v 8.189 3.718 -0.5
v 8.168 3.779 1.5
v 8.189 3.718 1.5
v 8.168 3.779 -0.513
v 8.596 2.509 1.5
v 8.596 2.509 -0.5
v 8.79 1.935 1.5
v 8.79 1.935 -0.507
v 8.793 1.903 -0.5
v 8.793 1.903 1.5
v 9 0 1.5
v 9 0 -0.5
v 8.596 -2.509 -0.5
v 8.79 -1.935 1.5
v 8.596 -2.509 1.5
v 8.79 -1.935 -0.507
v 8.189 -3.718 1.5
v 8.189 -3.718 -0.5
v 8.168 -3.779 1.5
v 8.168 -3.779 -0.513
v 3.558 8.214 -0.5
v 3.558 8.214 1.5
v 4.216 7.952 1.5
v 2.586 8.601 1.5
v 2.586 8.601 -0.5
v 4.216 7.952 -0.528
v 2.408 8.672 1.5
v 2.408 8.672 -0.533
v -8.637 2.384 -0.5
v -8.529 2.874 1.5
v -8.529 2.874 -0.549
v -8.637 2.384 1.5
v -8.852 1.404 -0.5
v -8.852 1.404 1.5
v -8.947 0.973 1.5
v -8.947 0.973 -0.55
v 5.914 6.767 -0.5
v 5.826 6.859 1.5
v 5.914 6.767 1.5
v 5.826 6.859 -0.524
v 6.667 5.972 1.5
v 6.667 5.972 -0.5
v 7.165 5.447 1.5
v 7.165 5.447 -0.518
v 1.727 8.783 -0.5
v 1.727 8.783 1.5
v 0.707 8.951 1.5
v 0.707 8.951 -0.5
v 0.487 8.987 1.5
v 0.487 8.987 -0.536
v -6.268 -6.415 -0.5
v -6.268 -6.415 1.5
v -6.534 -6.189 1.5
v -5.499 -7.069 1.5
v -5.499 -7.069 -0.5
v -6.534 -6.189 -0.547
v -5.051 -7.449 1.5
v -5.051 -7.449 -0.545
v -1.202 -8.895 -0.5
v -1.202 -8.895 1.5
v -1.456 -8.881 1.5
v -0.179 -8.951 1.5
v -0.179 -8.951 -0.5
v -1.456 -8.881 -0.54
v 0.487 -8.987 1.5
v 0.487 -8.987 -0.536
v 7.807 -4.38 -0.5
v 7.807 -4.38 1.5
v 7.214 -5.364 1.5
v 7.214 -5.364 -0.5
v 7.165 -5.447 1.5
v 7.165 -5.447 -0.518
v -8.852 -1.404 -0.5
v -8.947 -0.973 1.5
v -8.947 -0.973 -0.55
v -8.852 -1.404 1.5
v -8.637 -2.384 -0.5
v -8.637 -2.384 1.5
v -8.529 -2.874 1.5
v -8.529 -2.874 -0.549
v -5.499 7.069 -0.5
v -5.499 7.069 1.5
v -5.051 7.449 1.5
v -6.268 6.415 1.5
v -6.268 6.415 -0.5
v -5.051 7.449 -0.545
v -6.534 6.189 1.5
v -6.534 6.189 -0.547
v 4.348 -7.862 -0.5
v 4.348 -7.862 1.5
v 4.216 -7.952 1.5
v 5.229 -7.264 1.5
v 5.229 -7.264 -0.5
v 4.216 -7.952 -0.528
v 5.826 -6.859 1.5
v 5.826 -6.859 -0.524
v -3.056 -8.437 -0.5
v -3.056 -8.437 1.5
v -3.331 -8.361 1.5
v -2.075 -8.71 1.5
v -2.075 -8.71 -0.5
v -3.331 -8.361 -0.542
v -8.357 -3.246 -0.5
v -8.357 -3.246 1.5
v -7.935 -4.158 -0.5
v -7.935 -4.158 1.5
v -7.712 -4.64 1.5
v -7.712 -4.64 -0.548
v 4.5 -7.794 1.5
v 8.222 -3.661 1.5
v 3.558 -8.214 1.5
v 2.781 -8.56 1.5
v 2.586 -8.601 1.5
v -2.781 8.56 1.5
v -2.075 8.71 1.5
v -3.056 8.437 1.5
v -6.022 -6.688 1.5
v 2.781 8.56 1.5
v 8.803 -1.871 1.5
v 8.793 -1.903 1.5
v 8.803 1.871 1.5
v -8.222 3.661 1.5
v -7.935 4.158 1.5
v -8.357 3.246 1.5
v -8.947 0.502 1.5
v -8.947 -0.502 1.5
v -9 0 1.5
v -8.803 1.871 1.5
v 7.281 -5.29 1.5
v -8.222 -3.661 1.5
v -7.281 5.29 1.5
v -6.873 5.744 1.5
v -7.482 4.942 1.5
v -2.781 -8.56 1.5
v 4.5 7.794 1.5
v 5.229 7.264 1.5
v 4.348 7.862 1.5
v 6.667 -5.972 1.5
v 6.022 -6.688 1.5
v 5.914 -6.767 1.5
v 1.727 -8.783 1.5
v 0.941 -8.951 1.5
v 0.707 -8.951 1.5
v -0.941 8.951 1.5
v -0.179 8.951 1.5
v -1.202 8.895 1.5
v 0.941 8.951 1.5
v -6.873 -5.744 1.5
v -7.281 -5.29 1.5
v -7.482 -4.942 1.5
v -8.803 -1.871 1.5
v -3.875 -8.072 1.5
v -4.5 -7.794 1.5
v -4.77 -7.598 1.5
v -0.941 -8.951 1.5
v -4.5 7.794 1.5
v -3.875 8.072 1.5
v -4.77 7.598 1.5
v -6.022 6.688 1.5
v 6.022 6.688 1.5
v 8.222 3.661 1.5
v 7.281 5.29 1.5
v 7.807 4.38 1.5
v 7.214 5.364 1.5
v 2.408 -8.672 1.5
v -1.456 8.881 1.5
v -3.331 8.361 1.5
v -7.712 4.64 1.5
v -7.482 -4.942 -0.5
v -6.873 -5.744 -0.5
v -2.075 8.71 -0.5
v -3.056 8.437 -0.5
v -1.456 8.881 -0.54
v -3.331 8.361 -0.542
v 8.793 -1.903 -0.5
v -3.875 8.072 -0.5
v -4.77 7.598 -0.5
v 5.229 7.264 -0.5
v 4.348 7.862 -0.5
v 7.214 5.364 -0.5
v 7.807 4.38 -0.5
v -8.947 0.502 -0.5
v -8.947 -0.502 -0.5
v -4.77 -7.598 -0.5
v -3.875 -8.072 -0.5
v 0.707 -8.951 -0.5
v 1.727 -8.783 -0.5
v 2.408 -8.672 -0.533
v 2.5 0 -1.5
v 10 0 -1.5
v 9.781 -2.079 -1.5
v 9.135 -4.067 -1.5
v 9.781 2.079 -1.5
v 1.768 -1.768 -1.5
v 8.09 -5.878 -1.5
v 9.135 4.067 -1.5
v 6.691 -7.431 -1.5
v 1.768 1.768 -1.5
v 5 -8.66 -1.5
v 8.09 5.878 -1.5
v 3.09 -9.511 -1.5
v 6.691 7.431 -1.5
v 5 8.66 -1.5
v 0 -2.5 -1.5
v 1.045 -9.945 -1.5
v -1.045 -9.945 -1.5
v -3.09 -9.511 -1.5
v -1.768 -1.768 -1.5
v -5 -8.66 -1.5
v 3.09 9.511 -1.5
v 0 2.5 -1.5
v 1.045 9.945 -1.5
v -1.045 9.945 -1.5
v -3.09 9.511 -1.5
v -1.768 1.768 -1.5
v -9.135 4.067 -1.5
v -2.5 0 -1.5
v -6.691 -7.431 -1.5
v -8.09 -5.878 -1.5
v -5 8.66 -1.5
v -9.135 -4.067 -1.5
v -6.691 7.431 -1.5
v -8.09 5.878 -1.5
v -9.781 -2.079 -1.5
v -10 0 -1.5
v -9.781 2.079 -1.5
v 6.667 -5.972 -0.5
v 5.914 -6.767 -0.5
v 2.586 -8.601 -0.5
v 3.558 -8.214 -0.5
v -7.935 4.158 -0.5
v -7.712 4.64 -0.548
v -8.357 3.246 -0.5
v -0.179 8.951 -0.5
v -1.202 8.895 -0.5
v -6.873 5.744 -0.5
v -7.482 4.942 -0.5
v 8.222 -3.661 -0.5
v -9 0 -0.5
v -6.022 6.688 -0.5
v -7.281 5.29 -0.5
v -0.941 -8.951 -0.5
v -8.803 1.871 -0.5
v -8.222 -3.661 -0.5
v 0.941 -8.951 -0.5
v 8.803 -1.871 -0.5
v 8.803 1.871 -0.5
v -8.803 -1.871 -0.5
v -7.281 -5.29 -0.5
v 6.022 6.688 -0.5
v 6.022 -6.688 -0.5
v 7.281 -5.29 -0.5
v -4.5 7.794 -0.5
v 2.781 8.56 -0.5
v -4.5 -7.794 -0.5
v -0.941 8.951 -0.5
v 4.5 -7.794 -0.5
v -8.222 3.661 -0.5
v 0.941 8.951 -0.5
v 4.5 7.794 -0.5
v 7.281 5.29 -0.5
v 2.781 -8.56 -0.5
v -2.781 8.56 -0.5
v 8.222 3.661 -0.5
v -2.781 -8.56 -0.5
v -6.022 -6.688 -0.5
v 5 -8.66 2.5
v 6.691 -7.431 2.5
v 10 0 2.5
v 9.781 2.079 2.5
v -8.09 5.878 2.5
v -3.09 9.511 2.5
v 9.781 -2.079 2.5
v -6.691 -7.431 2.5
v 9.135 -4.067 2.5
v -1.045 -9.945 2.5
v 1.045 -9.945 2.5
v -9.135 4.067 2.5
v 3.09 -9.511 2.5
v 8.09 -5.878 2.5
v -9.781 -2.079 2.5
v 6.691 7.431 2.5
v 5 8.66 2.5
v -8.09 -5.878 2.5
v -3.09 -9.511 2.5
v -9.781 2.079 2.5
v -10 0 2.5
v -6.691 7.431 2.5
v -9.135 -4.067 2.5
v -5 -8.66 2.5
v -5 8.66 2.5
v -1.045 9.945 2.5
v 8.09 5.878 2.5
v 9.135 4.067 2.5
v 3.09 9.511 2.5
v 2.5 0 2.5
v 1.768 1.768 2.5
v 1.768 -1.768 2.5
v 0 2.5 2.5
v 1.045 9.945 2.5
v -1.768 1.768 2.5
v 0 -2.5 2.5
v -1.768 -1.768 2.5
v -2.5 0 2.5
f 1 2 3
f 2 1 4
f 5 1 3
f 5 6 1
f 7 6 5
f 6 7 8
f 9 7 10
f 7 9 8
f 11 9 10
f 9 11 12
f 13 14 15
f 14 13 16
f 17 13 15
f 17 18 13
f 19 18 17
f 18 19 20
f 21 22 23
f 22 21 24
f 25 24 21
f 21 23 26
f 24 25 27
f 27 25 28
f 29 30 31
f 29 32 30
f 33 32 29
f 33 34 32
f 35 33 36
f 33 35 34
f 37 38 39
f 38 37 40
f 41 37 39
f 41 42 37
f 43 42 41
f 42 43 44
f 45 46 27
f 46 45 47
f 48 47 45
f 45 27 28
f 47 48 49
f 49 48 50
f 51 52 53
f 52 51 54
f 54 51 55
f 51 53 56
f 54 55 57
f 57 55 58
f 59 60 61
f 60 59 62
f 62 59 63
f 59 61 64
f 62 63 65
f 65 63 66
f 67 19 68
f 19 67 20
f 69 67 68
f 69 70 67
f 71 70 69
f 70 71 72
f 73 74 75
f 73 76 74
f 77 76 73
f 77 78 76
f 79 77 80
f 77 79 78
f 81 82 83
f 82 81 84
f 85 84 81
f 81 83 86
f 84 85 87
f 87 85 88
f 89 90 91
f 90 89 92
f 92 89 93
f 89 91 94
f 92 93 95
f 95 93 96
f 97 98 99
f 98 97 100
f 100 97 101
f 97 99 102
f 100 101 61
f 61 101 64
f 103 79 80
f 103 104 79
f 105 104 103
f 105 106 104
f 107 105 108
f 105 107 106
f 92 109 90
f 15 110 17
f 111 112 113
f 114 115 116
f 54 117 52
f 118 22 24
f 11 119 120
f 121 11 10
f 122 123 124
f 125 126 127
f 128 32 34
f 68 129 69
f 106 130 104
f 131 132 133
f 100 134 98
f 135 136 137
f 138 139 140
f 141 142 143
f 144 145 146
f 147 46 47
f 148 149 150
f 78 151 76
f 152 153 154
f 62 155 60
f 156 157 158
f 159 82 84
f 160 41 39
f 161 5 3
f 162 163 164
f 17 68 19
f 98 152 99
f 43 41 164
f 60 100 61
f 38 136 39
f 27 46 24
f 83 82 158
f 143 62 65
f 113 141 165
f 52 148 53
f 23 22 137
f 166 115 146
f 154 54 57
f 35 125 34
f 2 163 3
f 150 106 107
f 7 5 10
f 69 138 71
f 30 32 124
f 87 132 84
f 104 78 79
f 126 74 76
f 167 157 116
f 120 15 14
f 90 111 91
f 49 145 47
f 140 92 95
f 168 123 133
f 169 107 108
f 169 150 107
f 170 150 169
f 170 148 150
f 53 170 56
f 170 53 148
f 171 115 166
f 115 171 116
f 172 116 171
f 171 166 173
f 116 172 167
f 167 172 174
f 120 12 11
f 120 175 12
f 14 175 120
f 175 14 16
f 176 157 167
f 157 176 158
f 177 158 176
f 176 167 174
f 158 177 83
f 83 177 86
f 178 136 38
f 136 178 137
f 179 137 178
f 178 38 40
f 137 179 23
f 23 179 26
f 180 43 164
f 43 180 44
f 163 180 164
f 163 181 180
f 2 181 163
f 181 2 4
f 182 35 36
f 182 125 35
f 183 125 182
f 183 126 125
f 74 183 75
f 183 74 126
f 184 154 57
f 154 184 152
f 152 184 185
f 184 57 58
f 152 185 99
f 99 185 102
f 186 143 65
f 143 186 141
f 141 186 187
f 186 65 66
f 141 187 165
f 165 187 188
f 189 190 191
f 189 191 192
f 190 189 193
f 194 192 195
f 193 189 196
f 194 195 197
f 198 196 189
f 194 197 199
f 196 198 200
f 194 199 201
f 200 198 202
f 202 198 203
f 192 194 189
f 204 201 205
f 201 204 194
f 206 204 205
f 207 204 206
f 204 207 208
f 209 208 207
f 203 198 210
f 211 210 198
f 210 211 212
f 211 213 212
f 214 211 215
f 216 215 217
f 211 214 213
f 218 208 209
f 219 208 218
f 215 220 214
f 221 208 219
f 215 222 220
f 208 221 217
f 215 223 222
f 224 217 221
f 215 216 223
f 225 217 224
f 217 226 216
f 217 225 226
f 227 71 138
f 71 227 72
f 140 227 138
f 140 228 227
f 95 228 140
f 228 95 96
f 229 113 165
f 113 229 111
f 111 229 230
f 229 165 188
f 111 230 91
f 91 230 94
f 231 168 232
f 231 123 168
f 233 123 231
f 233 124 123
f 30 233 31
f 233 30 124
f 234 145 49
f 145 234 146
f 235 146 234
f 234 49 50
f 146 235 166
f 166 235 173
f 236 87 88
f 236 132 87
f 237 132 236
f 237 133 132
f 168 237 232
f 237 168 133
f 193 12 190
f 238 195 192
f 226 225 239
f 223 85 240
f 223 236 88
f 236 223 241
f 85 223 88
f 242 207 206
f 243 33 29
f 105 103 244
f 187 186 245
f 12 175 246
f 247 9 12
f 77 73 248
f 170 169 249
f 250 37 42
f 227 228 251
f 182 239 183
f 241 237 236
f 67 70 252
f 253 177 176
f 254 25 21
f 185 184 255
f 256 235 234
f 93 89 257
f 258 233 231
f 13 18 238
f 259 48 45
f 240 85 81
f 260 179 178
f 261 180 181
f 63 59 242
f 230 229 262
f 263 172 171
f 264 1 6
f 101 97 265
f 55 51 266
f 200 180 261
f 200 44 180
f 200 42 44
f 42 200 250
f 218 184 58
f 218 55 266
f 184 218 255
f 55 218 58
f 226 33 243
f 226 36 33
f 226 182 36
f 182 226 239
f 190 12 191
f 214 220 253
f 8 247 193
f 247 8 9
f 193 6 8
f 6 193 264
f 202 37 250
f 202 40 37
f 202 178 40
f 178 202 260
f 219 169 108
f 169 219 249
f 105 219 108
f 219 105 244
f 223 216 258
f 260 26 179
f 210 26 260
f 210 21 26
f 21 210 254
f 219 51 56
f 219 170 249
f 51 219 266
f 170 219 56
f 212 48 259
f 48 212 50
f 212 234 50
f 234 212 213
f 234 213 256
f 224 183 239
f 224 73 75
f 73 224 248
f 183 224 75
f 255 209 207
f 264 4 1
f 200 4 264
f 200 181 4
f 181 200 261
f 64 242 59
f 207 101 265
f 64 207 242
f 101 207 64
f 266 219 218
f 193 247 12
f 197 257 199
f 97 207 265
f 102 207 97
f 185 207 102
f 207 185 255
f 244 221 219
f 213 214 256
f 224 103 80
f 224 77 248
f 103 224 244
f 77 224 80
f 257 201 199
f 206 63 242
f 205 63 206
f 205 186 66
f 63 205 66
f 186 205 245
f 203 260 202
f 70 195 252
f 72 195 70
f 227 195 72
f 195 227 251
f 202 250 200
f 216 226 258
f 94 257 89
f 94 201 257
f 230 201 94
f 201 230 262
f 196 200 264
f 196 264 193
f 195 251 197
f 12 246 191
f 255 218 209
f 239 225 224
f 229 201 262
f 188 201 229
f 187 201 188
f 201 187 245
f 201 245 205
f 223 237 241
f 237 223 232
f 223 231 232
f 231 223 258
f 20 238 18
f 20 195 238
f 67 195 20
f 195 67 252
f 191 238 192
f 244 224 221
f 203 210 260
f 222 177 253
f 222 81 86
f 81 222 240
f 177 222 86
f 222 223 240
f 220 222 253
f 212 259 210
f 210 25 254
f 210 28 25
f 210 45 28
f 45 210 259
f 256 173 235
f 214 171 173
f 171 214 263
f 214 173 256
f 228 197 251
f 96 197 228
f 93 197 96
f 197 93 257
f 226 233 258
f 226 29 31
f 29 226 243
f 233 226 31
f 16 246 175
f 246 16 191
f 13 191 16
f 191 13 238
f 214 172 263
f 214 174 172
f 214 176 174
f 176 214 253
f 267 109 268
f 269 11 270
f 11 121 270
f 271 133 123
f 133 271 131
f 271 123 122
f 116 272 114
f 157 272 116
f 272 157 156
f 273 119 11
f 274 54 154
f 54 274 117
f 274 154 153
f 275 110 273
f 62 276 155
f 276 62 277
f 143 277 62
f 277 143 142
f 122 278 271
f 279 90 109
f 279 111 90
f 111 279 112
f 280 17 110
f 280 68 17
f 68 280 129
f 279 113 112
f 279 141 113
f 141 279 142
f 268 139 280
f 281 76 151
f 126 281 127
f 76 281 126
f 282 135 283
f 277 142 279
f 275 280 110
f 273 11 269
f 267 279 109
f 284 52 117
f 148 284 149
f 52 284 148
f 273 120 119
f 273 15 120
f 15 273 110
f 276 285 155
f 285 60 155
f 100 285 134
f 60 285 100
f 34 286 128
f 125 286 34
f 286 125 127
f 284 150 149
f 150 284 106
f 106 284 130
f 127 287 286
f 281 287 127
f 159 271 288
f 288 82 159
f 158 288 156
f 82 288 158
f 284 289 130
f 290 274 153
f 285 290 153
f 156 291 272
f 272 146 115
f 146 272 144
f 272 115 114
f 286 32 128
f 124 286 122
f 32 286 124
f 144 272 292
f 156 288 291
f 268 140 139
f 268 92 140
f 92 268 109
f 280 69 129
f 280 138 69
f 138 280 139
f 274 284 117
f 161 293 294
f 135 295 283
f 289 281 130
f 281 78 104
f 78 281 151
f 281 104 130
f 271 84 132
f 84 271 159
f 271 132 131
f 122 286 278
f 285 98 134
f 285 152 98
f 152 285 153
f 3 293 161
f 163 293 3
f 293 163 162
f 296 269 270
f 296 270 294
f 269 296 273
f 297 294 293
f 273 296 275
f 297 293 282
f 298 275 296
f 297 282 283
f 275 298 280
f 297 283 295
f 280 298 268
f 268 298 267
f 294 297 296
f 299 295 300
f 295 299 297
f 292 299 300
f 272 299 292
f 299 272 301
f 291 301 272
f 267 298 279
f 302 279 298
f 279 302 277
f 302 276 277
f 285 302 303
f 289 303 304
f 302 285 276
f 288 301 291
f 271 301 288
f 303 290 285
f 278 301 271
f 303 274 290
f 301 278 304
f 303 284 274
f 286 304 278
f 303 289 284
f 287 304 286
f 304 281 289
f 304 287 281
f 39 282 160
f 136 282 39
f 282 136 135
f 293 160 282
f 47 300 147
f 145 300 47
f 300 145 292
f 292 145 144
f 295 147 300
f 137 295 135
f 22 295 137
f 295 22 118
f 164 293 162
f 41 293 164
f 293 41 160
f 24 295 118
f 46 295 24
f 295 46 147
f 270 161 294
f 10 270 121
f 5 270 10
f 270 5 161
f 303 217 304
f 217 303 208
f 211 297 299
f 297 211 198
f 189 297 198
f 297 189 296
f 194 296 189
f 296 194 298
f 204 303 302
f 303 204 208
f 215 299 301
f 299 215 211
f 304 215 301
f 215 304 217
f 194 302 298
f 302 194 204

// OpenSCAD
// Parameters
outer_diameter = 20; // Outer diameter of the magnet
height = 5;          // Height of the magnet
bore_diameter = 5;   // Diameter of the central bore
edge_rounding = 1;   // Edge rounding radius

// Magnet body with optional edge rounding
module magnet_body() {
    if (edge_rounding > 0) {
        cylinder(h = height - 2 * edge_rounding, d = outer_diameter - 2 * edge_rounding, center = true);
        translate([0, 0, -(height / 2 - edge_rounding)])
            cylinder(h = edge_rounding, d1 = outer_diameter, d2 = outer_diameter - 2 * edge_rounding, center = false);
        translate([0, 0, height / 2 - edge_rounding])
            cylinder(h = edge_rounding, d1 = outer_diameter - 2 * edge_rounding, d2 = outer_diameter, center = false);
    } else {
        cylinder(h = height, d = outer_diameter, center = true);
    }
}

// Optional central bore
module optional_center_bore() {
    if (bore_diameter > 0) {
        cylinder(h = height + 2, d = bore_diameter, center = true);
    }
}

// Complete magnet with optional bore
module magnet() {
    difference() {
        magnet_body();
        optional_center_bore();
    }
}

// Render the magnet
magnet();
